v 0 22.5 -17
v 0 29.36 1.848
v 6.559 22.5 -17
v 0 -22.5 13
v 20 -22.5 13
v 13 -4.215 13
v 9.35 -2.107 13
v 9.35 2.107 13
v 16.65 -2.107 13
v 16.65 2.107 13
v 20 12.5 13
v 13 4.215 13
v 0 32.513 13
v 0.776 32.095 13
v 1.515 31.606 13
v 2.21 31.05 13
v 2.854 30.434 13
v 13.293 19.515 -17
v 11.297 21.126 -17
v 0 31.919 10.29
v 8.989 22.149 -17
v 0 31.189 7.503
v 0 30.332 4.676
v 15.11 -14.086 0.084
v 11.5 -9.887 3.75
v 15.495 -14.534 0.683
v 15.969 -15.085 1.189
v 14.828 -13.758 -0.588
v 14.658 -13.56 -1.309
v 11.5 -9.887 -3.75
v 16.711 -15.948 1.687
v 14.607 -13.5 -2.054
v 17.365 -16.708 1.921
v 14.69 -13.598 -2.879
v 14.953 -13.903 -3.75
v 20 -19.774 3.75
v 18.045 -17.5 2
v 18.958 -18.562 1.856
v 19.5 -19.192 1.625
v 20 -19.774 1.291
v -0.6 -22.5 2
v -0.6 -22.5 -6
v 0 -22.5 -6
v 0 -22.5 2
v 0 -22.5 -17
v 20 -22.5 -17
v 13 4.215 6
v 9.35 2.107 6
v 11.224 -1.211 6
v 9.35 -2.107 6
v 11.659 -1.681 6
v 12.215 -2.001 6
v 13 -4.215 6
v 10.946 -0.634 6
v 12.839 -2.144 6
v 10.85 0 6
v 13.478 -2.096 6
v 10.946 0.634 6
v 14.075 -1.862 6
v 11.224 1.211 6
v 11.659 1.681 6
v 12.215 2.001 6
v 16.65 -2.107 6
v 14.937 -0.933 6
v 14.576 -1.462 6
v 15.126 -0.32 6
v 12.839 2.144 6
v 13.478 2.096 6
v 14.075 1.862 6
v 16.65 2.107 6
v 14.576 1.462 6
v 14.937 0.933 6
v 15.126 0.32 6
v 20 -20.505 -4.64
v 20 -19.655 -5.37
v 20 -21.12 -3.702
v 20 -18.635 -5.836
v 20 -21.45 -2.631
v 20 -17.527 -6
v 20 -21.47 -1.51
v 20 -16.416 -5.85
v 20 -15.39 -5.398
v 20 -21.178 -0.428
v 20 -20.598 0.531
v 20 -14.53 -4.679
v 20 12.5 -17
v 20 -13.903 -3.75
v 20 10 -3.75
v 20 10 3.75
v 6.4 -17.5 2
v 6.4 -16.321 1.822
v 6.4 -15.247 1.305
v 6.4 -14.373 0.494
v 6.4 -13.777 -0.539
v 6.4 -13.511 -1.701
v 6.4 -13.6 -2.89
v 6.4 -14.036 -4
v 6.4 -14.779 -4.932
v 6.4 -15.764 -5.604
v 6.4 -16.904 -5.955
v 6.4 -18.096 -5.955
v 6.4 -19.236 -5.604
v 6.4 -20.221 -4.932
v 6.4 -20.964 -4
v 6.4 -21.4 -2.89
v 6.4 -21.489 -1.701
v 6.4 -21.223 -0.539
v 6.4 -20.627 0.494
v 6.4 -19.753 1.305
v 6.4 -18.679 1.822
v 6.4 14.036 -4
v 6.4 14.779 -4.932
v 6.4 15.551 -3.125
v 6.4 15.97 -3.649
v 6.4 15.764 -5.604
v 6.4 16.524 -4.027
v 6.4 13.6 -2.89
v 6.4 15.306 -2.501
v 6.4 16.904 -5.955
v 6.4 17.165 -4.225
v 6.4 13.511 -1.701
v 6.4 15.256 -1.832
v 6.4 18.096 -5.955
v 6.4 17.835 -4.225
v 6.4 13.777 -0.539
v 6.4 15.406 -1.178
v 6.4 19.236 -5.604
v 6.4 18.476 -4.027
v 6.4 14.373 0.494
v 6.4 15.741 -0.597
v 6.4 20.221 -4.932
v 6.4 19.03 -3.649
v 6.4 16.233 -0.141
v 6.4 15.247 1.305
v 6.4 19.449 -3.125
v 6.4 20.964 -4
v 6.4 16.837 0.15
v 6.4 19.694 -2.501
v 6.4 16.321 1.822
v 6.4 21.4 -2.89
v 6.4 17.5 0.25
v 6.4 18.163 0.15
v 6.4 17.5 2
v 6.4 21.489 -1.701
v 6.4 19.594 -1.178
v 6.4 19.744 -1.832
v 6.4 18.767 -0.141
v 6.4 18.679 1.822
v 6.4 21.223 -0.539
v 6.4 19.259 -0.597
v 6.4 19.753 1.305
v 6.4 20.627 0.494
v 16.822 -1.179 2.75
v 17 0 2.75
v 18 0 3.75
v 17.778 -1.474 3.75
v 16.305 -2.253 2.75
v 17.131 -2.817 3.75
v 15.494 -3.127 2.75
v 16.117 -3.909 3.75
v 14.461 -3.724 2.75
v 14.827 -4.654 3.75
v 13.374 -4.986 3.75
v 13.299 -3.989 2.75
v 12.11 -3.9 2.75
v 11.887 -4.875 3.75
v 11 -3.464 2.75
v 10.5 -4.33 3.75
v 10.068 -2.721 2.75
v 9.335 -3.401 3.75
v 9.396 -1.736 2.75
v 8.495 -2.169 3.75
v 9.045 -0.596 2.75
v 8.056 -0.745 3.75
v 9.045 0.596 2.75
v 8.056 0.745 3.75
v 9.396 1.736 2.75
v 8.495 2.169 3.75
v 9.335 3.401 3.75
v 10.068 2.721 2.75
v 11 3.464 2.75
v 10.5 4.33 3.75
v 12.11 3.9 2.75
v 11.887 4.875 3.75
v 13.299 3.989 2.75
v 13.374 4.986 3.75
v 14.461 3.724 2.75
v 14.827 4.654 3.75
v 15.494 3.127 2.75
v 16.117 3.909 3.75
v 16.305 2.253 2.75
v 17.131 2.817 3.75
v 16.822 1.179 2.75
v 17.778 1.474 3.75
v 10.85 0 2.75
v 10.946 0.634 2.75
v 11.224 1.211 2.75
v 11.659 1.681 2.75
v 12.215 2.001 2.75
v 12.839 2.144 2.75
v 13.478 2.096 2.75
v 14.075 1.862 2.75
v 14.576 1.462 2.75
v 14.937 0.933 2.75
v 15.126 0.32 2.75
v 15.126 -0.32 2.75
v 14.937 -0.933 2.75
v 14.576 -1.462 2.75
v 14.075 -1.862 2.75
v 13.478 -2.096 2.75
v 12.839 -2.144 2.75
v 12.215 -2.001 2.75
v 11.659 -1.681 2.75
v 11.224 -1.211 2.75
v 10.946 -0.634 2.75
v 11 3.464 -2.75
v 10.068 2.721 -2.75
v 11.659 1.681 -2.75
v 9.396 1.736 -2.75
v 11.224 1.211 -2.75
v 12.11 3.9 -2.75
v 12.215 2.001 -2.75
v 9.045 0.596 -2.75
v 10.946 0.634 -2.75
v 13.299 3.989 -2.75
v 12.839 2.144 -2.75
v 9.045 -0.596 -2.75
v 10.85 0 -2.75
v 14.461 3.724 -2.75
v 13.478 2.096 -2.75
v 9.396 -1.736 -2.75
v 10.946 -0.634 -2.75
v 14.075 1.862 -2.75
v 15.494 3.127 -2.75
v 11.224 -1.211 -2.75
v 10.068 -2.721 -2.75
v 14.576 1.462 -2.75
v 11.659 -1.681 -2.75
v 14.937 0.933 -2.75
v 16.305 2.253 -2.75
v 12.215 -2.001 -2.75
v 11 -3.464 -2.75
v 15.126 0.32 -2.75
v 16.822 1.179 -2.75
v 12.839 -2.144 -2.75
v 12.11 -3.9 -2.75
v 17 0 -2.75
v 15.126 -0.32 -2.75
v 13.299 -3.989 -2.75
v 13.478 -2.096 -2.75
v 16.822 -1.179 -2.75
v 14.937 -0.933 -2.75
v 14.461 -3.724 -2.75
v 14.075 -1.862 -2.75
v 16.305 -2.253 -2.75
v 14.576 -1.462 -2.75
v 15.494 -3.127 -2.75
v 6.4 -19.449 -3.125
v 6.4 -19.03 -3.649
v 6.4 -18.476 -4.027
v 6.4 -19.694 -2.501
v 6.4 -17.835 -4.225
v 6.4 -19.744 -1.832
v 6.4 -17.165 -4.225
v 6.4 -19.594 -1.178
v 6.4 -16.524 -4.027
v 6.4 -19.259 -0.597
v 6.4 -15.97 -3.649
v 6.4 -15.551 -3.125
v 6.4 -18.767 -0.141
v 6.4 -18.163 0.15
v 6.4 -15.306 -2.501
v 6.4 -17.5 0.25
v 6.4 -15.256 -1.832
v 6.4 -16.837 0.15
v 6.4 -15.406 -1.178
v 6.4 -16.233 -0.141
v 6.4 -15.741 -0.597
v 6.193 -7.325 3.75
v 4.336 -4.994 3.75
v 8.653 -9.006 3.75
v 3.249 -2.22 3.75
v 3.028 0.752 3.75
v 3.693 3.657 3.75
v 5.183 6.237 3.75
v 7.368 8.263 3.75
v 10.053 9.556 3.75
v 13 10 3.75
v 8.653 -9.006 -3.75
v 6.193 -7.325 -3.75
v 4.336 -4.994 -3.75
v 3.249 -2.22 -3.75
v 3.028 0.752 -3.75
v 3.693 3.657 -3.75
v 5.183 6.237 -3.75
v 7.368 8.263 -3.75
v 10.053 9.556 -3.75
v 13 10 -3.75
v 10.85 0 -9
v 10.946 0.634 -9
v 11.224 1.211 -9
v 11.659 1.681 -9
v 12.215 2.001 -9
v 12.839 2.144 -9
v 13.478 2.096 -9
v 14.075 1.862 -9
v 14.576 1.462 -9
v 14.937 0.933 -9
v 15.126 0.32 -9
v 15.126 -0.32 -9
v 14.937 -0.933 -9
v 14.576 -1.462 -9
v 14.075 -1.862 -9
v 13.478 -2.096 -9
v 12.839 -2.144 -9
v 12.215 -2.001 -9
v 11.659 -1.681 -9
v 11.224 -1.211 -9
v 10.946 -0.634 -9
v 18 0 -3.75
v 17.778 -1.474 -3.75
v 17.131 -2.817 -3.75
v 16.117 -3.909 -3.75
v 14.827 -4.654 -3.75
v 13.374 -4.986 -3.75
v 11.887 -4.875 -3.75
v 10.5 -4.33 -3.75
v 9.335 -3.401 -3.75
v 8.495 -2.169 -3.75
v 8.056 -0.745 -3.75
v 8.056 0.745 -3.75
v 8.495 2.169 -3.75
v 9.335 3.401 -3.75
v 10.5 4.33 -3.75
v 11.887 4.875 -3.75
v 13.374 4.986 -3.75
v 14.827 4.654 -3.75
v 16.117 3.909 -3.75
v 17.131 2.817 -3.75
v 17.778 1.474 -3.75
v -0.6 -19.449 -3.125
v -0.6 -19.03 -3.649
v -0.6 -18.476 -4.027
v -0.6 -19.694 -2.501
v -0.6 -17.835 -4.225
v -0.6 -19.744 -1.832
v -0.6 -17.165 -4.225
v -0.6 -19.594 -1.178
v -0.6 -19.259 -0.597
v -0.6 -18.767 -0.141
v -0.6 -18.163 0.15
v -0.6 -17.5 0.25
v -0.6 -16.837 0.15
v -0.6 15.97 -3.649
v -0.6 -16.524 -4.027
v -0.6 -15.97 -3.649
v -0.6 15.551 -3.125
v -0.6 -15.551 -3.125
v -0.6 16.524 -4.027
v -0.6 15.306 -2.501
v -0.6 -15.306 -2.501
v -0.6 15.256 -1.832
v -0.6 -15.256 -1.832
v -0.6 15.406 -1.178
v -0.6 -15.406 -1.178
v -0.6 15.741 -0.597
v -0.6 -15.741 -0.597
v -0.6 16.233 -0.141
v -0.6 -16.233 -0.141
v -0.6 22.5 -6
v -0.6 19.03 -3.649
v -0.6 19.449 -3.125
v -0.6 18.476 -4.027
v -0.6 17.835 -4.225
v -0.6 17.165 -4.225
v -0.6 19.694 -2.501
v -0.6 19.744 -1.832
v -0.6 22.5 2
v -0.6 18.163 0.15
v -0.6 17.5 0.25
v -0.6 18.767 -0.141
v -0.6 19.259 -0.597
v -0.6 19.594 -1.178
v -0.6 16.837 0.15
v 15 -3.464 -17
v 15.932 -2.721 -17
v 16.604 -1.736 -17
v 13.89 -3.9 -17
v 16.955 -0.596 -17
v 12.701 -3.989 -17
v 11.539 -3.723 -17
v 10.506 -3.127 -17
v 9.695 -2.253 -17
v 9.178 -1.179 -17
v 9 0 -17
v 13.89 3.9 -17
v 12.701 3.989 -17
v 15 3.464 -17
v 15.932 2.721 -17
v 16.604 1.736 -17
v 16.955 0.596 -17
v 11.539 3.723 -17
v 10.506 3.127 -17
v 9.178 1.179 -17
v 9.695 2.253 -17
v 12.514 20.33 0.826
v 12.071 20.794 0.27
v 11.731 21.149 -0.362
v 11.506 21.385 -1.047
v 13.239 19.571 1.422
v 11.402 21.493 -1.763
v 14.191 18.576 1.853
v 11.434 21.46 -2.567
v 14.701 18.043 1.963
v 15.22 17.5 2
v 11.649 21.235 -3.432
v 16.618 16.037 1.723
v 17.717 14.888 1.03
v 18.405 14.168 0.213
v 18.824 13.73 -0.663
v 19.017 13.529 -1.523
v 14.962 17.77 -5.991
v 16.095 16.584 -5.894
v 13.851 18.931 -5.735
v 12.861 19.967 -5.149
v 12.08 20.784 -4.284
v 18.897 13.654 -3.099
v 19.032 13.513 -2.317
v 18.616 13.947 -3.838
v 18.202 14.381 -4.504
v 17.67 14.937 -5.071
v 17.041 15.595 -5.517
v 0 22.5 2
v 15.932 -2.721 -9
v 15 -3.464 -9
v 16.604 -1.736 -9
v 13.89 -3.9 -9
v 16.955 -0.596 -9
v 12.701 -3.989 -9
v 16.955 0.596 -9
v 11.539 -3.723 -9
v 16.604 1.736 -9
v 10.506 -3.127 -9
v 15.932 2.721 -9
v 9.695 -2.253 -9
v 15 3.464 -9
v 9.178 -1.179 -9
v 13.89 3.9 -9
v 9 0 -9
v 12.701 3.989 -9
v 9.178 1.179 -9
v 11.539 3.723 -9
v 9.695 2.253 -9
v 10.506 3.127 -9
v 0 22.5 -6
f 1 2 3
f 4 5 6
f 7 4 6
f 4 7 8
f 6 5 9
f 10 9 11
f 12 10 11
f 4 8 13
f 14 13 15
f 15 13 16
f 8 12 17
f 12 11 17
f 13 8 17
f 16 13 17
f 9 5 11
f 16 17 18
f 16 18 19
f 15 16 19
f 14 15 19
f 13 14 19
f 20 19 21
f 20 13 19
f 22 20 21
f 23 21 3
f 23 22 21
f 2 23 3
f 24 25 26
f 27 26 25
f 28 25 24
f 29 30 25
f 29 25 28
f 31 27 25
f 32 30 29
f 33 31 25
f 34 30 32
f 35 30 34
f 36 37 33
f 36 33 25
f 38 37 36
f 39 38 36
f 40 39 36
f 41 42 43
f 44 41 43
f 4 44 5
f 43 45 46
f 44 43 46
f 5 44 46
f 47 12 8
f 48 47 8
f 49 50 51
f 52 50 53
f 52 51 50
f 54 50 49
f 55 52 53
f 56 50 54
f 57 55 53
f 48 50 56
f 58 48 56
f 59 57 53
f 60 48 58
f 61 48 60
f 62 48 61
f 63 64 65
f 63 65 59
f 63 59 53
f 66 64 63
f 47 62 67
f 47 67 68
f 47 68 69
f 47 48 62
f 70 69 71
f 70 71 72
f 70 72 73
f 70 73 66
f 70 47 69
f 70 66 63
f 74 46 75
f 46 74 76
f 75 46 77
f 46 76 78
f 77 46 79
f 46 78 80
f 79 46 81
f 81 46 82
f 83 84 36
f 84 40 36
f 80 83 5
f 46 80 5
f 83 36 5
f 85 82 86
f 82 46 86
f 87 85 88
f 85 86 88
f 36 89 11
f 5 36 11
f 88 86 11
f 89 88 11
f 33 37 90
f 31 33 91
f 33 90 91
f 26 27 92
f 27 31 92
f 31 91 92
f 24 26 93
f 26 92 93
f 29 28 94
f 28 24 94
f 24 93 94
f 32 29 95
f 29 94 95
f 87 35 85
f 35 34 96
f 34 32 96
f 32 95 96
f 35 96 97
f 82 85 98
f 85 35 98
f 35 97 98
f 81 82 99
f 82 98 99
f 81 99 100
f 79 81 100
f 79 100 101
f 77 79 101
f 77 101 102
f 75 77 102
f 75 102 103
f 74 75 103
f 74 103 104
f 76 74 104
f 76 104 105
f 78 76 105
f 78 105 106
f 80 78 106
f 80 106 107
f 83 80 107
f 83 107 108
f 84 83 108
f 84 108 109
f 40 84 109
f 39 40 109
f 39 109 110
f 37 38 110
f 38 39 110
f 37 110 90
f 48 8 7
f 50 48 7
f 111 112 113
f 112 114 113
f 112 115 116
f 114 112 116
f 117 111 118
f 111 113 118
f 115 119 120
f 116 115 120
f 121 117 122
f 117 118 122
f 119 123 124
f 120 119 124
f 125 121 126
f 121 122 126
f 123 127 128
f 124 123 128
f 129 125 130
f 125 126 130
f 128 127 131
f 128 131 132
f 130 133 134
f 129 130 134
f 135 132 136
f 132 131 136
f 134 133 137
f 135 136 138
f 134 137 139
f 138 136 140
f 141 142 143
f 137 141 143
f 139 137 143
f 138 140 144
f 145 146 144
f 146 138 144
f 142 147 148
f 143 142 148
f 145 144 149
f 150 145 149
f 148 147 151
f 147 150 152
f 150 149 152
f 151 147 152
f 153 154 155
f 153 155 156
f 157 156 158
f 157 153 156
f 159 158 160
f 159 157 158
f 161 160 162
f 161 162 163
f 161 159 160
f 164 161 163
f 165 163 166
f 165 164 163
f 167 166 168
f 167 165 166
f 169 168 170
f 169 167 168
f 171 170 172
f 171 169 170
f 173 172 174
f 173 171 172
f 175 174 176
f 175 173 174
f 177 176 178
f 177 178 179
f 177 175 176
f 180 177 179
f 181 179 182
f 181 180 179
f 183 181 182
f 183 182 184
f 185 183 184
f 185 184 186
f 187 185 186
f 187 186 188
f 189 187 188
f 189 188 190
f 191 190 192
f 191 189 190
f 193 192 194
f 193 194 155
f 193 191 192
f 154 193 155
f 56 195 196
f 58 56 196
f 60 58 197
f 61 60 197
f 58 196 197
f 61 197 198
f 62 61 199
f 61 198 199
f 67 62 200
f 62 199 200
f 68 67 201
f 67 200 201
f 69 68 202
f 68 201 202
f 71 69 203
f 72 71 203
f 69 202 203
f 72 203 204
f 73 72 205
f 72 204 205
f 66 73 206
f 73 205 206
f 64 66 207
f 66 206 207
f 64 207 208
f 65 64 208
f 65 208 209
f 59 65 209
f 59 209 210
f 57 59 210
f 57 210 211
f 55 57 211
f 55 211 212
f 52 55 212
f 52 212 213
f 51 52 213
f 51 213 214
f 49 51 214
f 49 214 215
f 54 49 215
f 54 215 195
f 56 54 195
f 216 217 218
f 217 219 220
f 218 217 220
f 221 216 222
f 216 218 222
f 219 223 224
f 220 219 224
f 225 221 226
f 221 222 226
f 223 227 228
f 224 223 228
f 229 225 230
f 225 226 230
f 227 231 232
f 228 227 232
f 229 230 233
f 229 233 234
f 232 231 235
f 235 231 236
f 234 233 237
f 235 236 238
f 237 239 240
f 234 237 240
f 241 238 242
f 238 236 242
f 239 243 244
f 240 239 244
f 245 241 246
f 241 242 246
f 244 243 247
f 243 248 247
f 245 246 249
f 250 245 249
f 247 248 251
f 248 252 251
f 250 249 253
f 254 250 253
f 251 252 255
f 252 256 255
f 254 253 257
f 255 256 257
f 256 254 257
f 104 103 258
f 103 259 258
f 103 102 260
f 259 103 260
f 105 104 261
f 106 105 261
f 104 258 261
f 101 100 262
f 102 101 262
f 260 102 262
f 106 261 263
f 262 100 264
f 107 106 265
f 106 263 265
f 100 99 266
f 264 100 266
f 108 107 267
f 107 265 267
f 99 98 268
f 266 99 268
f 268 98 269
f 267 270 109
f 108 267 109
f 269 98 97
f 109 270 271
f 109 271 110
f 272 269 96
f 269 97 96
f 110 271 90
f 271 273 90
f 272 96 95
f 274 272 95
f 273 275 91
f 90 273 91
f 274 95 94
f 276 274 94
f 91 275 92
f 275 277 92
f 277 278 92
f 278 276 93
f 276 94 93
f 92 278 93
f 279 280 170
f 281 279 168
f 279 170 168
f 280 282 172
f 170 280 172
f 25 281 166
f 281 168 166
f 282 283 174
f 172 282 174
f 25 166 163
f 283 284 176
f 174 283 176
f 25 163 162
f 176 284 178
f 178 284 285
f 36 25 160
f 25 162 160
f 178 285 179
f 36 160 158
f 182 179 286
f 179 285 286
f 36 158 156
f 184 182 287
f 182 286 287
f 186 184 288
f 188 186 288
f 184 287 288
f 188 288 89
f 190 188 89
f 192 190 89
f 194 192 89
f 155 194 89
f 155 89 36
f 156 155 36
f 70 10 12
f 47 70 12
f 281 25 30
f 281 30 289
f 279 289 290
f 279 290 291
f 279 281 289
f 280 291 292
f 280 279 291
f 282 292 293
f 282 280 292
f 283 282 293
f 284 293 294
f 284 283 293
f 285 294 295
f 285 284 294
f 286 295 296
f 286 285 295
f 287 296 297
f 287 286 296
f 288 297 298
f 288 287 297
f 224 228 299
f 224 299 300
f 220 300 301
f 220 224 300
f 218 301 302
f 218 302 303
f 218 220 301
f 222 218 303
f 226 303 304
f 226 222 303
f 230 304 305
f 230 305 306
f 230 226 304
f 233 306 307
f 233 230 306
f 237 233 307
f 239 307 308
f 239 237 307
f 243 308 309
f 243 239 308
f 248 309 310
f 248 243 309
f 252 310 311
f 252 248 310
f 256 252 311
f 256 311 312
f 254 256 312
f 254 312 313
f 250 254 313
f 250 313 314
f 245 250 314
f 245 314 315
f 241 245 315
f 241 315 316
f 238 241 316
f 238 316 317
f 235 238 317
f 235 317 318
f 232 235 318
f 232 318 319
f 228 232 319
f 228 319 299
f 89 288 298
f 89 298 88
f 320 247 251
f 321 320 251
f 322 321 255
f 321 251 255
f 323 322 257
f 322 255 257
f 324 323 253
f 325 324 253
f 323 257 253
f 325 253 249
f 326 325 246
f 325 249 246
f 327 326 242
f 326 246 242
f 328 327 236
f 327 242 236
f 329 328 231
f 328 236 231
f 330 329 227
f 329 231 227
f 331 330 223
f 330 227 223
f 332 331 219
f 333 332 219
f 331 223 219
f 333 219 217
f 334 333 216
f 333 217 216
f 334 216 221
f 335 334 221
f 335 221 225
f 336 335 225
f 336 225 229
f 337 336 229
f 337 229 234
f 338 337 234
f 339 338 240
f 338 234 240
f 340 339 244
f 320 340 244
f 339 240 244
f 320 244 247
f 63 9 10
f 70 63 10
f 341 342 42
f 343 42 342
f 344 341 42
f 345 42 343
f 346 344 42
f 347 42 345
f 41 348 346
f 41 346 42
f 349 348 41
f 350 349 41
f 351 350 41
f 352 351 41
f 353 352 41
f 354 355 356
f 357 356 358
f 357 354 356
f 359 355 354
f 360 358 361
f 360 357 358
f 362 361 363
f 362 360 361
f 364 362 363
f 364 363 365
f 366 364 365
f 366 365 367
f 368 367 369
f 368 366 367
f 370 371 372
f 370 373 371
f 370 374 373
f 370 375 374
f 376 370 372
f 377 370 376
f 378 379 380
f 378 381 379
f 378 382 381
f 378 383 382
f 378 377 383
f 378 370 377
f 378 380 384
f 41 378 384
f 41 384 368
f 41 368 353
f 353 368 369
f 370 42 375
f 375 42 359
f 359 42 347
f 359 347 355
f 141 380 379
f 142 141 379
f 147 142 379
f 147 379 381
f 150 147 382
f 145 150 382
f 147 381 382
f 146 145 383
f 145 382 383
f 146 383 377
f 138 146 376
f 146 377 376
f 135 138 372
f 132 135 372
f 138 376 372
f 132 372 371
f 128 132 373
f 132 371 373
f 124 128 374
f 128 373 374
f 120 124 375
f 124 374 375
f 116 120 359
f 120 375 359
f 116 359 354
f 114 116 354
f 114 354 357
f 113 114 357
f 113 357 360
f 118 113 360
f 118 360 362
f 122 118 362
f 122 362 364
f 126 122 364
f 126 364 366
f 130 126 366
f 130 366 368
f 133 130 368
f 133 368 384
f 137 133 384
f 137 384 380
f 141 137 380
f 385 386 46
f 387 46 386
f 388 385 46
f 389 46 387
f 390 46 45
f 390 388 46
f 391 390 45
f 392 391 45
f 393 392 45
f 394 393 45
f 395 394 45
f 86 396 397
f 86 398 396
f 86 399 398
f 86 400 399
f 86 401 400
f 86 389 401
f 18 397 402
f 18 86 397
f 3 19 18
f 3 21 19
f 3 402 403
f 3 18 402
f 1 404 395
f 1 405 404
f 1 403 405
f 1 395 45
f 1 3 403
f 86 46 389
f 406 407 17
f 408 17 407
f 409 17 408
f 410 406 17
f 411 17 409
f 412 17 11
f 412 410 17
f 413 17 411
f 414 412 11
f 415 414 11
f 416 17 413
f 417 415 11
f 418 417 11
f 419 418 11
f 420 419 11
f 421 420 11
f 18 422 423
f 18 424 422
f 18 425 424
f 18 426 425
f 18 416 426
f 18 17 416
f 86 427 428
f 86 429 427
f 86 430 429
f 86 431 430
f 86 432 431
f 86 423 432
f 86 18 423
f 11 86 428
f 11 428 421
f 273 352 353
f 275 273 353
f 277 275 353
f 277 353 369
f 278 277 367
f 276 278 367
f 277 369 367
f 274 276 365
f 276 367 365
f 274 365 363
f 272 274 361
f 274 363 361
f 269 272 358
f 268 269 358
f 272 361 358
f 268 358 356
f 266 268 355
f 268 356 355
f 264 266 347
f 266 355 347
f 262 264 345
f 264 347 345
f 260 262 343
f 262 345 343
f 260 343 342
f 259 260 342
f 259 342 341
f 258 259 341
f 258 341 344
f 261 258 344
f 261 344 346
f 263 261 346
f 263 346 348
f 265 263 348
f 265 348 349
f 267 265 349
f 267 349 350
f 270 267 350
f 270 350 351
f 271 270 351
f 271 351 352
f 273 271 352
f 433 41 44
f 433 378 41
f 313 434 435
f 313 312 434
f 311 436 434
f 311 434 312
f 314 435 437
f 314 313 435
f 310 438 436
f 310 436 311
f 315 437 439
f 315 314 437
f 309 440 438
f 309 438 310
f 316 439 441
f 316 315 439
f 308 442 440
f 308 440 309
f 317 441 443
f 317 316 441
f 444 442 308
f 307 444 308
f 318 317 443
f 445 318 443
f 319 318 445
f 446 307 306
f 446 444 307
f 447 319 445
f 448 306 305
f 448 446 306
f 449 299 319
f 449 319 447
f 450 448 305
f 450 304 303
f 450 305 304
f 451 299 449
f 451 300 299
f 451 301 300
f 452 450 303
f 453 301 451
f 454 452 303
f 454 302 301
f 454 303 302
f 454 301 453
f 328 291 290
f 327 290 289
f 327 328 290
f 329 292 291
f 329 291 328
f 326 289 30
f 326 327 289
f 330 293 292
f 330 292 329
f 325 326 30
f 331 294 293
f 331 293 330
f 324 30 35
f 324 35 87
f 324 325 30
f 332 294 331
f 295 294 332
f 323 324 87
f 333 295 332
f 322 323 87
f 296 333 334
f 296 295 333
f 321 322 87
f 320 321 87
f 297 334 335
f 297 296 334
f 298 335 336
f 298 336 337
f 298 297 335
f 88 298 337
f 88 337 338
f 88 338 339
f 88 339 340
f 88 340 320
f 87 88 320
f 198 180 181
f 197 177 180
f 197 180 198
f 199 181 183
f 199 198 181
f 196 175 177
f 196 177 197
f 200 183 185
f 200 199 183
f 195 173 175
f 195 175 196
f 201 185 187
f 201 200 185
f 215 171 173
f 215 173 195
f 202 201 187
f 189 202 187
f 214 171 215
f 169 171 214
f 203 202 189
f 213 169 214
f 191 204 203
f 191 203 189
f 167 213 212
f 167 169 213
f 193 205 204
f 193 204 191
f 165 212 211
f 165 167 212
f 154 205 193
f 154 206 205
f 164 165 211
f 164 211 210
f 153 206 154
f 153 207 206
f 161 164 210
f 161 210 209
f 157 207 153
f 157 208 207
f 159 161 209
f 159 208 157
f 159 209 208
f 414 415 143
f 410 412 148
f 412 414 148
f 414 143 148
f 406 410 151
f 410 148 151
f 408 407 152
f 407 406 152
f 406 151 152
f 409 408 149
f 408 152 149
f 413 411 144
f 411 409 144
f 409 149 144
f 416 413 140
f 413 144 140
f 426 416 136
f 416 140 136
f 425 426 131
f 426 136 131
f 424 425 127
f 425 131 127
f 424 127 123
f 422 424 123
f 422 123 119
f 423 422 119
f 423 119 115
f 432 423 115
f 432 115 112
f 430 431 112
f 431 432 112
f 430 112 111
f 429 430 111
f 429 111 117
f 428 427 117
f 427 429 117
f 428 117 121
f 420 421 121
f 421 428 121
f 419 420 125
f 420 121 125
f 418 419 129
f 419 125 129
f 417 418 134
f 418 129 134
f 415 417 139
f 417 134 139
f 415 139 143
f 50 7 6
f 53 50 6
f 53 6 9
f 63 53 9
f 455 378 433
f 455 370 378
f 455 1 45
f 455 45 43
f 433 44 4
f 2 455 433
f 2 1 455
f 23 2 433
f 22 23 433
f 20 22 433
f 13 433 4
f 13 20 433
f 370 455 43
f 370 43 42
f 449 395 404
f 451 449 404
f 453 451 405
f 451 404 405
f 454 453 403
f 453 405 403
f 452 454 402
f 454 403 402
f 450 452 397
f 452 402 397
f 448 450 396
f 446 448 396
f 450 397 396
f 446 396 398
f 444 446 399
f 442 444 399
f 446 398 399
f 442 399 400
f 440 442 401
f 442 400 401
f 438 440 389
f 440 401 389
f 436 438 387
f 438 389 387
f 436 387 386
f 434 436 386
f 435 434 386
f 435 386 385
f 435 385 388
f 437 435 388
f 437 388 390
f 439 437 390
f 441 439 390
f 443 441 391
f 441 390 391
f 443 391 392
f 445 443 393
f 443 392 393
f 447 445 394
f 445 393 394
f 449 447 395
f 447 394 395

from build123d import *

# Parameters (mm, degrees)
BOSS_EXTRUDE1_DEPTH = 22.5
CUT_EXTRUDE1_DEPTH  = 3.75
SKETCH3_R           = 2.15
CUT_EXTRUDE2_DEPTH  = 43.5
CUT_EXTRUDE3_DEPTH  = 7
SKETCH5_R           = 4
CUT_EXTRUDE4_DEPTH  = 8
CHAMFER4_START      = -3.75
CHAMFER4_DEPTH      = 7.5
SKETCH7_R           = 2.25
CUT_EXTRUDE5_DEPTH  = 35.922915113
CUT_EXTRUDE6_START  = -7
SKETCH8_R           = 4
CUT_EXTRUDE6_DEPTH  = 28.922915113
BOSS_EXTRUDE2_DEPTH = 20
CUT_EXTRUDE7_DEPTH  = 50.161333531
FILLET1_R           = 8
BOSS_EXTRUDE3_START = 1
SKETCH11_R          = 5
SKETCH11_R_2        = 2.15
BOSS_EXTRUDE3_DEPTH = 1
CHAMFER5_SIZE       = 1


with BuildPart() as part:
    # Sketch1 → Boss-Extrude1 (new, symmetric)
    with BuildSketch(Plane(origin=(0, 0, 0), x_dir=(1, 0, 0), z_dir=(0, 1, 0))):
        Polygon((0, -2), (0, -13), (20, -13), (20, 17), (0, 17), (0, 6), (-0.6, 6), (-0.6, -2), align=None)
    extrude(amount=BOSS_EXTRUDE1_DEPTH, both=True)

    # Sketch2 → Cut-Extrude1 (cut, symmetric)
    with BuildSketch(Plane.XY):
        with BuildLine():
            Line((13, 10), (20, 10))
            ThreePointArc((20, 10), (30, 0), (20, -10))
            Line((20, -10), (13, -10))
            ThreePointArc((13, -10), (3, 0), (13, 10))
        make_face()
    extrude(amount=CUT_EXTRUDE1_DEPTH, both=True, mode=Mode.SUBTRACT)

    # Sketch3 → Cut-Extrude2 (cut, through all)
    with BuildSketch(Plane(origin=(0, 0, -17), x_dir=(-1, 0, 0), z_dir=(0, 0, -1))):
        with Locations((-13, 0)):
            Circle(SKETCH3_R)
    extrude(amount=-CUT_EXTRUDE2_DEPTH, mode=Mode.SUBTRACT)

    # Sketch4 → Cut-Extrude3 (cut)
    with BuildSketch(Plane.XY.offset(13)):
        Polygon((13, -4.214656965), (16.65, -2.107328483), (16.65, 2.107328483), (13, 4.214656965), (9.35, 2.107328483), (9.35, -2.107328483), align=None)
    extrude(amount=-CUT_EXTRUDE3_DEPTH, mode=Mode.SUBTRACT)

    # Sketch5 → Cut-Extrude4 (cut)
    with BuildSketch(Plane(origin=(0, 0, -17), x_dir=(-1, 0, 0), z_dir=(0, 0, -1))):
        with Locations((-13, 0)):
            Circle(SKETCH5_R)
    extrude(amount=-CUT_EXTRUDE4_DEPTH, mode=Mode.SUBTRACT)

    # Chamfer4: read off the stored shape, not the designer's step
    # Chamfer4 outline → Chamfer4 (cut)
    with BuildSketch(Plane.XY.offset(CHAMFER4_START)):
        with BuildLine():
            ThreePointArc((13, -10), (12.247869581, -9.971674876), (11.5, -9.886859967))
            Line((11.5, -9.886859967), (20, -19.773719933))
            Line((20, -19.773719933), (20, -10))
            Line((20, -10), (13, -10))
        make_face()
    extrude(amount=CHAMFER4_DEPTH, mode=Mode.SUBTRACT)

    # Sketch7 → Cut-Extrude5 (cut, through all)
    with BuildSketch(Plane.ZY.offset(0.6)):
        with Locations((-2, 17.5)):
            Circle(SKETCH7_R)
        with Locations((-2, -17.5)):
            Circle(SKETCH7_R)
    extrude(amount=-CUT_EXTRUDE5_DEPTH, mode=Mode.SUBTRACT)

    # Sketch8 → Cut-Extrude6 (cut, through all)
    with BuildSketch(Plane.ZY.offset(0.6).offset(CUT_EXTRUDE6_START)):
        with Locations((-2, 17.5)):
            Circle(SKETCH8_R)
        with Locations((-2, -17.5)):
            Circle(SKETCH8_R)
    extrude(amount=-CUT_EXTRUDE6_DEPTH, mode=Mode.SUBTRACT)

    # Sketch9 → Boss-Extrude2 (add)
    with BuildSketch(Plane(origin=(20, 0, 0), x_dir=(0, 0, -1), z_dir=(1, 0, 0))):
        Polygon((17, 22.5), (-13, 22.5), (-13, 33.419107028), align=None)
    extrude(amount=-BOSS_EXTRUDE2_DEPTH)

    # Sketch10 → Cut-Extrude7 (cut, through all)
    with BuildSketch(Plane(origin=(0, 0, -17), x_dir=(-1, 0, 0), z_dir=(0, 0, -1))):
        Polygon((-20, 12.5), (-20, 33.419107028), (0, 33.419107028), align=None)
    extrude(amount=-CUT_EXTRUDE7_DEPTH, mode=Mode.SUBTRACT)

    # Fillet1
    fillet1_edges = [part.edges().sort_by_distance(p)[0] for p in [
        (5.219681229, 27.959553514, -2),
    ]]
    fillet(fillet1_edges, radius=FILLET1_R)

    # Sketch11 → Boss-Extrude3 (add)
    with BuildSketch(Plane(origin=(0, 0, 3.75), x_dir=(-1, 0, 0), z_dir=(0, 0, -1)).offset(BOSS_EXTRUDE3_START)):
        with Locations(Location((-13, 0, 0), (0, 0, 180))):
            Circle(SKETCH11_R)
        with Locations((-13, 0)):
            Circle(SKETCH11_R_2, mode=Mode.SUBTRACT)
    boss_extrude3 = extrude(amount=-BOSS_EXTRUDE3_DEPTH)

    # Mirror1: Boss-Extrude3 across plane
    add(boss_extrude3.mirror(Plane(origin=(0, 0, 0), x_dir=(1, 0, 0), z_dir=(0, 0, -1))))

    # Chamfer5
    chamfer5_edges = [part.edges().sort_by_distance(p)[0] for p in [
        (8, 0, 2.75),
        (8, 0, -2.75),
    ]]
    chamfer(chamfer5_edges, length=CHAMFER5_SIZE - 0.0001)  # a hair under: the kernel refuses the full size


solid = part.part
